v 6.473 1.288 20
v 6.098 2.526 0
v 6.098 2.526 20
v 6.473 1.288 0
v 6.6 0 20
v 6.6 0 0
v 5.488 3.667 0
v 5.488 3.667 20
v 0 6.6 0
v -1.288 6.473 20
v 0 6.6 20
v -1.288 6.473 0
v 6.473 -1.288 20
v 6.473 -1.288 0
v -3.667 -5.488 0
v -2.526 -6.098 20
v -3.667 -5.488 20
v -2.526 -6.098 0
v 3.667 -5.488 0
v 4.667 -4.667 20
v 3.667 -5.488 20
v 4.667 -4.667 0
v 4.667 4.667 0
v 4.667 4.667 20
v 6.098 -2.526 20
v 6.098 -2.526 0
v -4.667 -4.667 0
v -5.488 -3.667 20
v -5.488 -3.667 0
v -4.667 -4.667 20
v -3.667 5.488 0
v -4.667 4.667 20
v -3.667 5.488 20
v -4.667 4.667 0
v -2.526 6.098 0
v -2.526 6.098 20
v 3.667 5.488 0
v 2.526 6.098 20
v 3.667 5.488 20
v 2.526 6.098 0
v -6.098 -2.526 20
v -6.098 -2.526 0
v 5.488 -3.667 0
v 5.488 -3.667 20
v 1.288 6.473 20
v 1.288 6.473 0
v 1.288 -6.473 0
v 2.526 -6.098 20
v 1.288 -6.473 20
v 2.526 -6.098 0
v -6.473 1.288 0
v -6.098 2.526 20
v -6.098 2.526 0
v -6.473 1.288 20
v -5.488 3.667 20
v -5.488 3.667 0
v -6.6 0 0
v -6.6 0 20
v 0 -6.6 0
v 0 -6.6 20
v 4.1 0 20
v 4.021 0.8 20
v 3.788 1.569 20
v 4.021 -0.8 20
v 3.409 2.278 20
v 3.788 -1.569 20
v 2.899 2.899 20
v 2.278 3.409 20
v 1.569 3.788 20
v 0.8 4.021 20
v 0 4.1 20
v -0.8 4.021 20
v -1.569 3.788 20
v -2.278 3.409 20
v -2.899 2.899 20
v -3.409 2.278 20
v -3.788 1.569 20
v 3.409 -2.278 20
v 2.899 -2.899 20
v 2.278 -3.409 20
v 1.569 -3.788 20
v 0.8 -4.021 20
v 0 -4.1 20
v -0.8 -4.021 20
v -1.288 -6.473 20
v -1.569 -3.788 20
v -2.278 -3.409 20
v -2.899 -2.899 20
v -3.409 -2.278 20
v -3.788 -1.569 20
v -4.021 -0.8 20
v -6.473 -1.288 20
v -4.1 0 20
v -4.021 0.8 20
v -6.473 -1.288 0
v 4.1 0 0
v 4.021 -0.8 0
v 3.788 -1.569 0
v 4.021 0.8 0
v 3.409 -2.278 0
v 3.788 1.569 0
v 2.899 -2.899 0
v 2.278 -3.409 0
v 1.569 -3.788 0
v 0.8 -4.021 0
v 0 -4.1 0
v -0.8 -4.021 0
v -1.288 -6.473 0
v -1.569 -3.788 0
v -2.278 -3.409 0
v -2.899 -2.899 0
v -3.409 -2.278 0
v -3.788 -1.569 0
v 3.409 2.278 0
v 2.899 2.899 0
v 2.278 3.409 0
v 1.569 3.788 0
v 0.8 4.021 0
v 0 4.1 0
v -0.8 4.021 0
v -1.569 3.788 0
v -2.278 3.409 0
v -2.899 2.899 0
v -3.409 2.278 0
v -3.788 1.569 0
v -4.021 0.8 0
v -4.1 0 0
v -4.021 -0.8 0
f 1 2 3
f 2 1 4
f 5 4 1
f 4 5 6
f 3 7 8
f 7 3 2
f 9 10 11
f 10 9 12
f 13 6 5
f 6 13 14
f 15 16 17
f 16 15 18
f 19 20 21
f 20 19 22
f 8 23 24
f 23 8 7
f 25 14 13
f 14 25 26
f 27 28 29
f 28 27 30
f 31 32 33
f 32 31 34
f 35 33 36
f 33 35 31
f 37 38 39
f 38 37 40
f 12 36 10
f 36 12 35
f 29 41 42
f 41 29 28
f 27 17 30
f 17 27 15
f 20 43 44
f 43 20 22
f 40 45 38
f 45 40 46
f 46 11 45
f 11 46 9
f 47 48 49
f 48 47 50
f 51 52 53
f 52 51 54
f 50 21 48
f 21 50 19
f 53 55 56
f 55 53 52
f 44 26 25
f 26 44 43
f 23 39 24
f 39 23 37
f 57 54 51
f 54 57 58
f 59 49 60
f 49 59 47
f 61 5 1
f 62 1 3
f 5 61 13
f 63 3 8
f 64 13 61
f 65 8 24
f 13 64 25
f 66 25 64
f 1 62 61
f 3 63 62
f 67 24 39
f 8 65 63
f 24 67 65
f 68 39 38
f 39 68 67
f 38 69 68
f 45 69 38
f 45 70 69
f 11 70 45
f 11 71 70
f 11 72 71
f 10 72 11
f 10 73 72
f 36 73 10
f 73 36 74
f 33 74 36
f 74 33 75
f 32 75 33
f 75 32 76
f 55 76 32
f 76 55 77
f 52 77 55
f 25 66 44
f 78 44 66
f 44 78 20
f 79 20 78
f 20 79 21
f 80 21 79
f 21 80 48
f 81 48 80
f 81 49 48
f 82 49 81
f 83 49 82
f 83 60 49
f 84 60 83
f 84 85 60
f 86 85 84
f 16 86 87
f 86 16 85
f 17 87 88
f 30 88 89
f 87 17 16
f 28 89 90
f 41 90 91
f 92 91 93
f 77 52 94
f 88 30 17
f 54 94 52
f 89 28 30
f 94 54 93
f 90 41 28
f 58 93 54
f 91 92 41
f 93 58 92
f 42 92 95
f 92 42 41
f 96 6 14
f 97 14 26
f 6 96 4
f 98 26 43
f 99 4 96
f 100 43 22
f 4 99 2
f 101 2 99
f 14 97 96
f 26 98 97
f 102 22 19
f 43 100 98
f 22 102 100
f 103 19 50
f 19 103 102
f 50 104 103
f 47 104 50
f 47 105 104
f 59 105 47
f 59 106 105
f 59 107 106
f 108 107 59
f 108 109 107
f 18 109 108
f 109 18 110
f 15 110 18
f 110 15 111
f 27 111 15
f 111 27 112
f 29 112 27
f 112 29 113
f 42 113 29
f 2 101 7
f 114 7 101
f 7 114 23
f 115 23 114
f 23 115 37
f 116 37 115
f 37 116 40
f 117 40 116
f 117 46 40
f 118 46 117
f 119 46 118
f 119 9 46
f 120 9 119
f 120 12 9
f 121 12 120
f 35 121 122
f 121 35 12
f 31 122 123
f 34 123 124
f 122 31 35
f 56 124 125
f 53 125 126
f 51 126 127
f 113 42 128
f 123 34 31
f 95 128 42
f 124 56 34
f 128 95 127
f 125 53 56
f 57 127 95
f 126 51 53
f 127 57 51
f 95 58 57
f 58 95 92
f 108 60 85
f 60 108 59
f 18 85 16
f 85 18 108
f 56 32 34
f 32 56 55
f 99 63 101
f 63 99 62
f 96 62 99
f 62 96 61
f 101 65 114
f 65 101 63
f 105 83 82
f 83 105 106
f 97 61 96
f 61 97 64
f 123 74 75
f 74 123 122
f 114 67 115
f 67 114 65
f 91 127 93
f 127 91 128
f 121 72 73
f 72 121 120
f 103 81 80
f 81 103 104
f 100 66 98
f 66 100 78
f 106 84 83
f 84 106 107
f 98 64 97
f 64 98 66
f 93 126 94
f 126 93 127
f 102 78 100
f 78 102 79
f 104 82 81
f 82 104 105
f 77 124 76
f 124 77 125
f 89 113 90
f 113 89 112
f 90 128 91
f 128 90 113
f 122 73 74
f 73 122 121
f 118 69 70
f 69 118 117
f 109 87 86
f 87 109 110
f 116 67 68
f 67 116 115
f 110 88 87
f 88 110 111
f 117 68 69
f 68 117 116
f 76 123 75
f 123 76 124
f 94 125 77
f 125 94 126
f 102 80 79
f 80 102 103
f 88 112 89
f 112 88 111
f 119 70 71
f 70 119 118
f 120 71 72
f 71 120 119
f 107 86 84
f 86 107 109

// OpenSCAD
$fn = 32;

// ----------------------------------------------------------------------
// Spacer sleeve: 13.2 / 8.2 x 20 mm
// ----------------------------------------------------------------------

// --- parameters (mm) ---
outer_d = 13.2;           // outside diameter
inner_d = 8.2;            // shaft bore
length = 20;              // sleeve length
step_d = 11.9;            // reduced diameter
step_l = 9;               // length of the step

module sleeve() {
  cylinder(h = length, d = outer_d);
  translate([0, 0, length - step_l]) cylinder(h = step_l, d = step_d);
}

difference() {
  sleeve();
  translate([0, 0, -1]) cylinder(h = length + 2, d = inner_d);
}
